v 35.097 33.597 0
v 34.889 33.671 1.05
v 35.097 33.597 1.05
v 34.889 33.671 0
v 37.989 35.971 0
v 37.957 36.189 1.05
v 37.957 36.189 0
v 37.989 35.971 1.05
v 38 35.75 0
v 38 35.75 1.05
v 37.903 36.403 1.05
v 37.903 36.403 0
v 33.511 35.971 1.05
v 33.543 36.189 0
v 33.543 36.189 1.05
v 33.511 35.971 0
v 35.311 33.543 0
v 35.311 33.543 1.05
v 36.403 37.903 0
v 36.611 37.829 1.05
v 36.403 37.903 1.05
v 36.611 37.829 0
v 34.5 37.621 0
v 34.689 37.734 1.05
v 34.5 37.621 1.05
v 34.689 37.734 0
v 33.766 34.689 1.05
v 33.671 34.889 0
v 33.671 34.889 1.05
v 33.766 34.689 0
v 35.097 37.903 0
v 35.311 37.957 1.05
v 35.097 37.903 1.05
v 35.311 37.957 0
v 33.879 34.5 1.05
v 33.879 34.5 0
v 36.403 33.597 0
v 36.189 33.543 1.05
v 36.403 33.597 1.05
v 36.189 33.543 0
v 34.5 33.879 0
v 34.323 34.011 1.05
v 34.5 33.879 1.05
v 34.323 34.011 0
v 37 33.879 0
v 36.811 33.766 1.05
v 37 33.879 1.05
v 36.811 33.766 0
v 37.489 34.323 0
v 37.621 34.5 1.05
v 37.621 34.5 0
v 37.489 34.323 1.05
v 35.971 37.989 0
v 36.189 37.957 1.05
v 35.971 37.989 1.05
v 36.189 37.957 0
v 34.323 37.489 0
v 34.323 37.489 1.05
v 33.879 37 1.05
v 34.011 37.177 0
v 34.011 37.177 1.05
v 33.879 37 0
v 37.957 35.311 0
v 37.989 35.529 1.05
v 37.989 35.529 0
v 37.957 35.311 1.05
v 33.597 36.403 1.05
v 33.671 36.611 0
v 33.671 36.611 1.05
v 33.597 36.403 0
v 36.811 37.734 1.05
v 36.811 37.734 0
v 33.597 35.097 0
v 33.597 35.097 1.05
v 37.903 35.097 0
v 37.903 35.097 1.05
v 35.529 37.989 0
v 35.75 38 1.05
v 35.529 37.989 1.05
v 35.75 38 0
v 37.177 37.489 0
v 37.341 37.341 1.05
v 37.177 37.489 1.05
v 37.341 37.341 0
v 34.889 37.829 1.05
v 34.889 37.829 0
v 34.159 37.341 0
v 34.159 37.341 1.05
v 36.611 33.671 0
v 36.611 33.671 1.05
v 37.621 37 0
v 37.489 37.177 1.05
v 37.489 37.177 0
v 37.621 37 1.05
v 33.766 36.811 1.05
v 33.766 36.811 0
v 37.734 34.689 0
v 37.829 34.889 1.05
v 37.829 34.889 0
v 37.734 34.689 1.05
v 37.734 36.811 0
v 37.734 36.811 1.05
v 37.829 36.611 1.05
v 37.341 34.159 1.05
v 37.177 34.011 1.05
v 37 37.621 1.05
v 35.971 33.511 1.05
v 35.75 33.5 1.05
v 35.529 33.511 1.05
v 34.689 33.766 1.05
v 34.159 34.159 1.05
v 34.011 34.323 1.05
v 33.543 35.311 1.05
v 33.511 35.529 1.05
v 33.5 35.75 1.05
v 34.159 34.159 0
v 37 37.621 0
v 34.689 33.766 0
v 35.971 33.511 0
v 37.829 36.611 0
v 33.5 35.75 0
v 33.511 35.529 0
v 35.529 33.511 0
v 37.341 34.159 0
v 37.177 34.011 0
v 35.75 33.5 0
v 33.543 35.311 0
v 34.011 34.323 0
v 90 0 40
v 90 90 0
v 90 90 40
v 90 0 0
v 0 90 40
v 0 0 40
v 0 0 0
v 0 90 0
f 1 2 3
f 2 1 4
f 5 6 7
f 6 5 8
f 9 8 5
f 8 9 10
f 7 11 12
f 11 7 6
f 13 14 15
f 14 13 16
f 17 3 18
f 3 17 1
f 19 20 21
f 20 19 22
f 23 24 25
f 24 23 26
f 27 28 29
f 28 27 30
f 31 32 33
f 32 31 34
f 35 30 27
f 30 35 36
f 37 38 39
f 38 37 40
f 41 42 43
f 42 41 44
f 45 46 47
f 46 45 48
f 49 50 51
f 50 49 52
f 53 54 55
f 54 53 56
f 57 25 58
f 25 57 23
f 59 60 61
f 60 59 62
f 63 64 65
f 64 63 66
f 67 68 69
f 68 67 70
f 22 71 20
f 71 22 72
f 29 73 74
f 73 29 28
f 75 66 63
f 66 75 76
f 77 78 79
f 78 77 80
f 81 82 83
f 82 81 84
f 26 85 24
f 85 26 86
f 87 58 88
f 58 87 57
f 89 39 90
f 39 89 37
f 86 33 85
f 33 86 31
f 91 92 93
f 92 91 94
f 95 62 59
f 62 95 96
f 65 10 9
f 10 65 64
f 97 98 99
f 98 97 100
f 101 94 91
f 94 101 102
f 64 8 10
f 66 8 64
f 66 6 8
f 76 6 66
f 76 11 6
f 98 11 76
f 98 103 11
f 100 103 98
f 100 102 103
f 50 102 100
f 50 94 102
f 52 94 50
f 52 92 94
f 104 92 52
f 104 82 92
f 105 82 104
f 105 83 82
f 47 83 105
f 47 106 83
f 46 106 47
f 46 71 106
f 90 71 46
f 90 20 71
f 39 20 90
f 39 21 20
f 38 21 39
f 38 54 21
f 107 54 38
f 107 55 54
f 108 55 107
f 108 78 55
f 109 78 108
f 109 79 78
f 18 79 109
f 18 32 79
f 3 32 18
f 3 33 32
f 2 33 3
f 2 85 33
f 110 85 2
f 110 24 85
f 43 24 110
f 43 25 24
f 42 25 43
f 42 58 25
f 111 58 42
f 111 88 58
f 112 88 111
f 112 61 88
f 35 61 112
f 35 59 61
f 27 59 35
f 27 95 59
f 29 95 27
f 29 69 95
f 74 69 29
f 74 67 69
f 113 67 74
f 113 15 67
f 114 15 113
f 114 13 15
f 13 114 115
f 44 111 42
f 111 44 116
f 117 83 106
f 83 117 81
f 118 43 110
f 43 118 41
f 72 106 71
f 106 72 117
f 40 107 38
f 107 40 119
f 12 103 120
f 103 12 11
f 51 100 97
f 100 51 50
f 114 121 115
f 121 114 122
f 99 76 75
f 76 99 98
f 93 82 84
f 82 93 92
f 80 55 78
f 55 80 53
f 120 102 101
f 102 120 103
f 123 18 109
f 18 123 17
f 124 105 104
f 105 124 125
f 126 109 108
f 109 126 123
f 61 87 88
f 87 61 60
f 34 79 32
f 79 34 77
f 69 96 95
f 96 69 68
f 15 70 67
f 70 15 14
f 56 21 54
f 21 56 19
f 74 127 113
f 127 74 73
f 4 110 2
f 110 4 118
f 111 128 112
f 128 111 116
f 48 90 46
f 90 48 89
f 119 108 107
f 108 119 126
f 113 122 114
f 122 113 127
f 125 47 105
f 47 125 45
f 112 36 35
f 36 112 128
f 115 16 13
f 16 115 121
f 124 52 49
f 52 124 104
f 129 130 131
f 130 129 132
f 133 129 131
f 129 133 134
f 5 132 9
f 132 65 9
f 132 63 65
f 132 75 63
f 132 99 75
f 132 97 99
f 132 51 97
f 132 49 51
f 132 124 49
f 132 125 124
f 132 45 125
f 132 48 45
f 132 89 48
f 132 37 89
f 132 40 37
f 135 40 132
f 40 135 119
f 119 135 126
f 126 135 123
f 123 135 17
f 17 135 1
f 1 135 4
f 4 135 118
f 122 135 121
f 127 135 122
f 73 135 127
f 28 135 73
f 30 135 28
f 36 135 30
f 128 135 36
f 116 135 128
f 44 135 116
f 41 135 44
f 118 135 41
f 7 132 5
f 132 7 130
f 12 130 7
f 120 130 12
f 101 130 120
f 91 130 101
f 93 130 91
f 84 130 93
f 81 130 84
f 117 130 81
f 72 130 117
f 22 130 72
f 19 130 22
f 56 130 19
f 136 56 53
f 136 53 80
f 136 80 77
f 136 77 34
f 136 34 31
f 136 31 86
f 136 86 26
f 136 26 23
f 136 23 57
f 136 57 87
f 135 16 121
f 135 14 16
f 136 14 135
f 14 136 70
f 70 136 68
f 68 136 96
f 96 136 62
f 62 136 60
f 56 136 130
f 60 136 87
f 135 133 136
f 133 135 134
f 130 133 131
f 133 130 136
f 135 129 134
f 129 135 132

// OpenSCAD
// DIY Magnetic Stirrer Housing for 80mm PC Fan
// Print Orientation: Upside down (Top plate on bed)
// Units: mm

// --- Dimensions ---
// Outer footprint of the housing
W_OUT = 90;
H_OUT = 90;

// Thickness of the top plate (bottom of the box in print orientation)
THICK_TOP = 2;

// Height of the walls (Total height 40mm - 2mm top plate)
H_WALL = 38; 

// Wall thickness
THICK_WALL = 2.5;

// Fan mounting hole diameter (M4 clearance)
D_FAN_HOLE = 4.5;

// Fan mounting hole pattern: 71.5mm square, centred on the plate
PATTERN_SIZE = 71.5;

// Cable notch dimensions
NOTCH_W = 12;
NOTCH_H = 8; // Depth from open edge (z=40) down to z=32

// Resolution for curved features
$fn = 64;

// --- Helper: Create the main box block ---
module stirrer_housing() {
    // Total height
    h_total = THICK_TOP + H_WALL;
    
    difference() {
        // 1. Main Block
        // Outer size: W_OUT x H_OUT
        // Height: h_total
        // Centered at origin for X/Y, sitting on Z=0
        translate([0, 0, 0])
            cube([W_OUT, H_OUT, h_total], center = false);
        
        // 2. Cut Fan Mounting Holes through the top plate
        // Pattern: 71.5mm square centred on the 90x90 plate.
        // Centers are at: +/- 35.75, +/- 35.75
        // Z range: 0 to THICK_TOP (2mm)
        
        // Define the 4 offsets for the square pattern
        offsets = [
            [-PATTERN_SIZE/2, -PATTERN_SIZE/2],
            [-PATTERN_SIZE/2,  PATTERN_SIZE/2],
            [ PATTERN_SIZE/2, -PATTERN_SIZE/2],
            [ PATTERN_SIZE/2,  PATTERN_SIZE/2]
        ];
        
        for (p = offsets) {
            // p[0] is X offset, p[1] is Y offset
            translate([p[0], p[1], 0])
                cylinder(
                    h = THICK_TOP + 0.1, // Extend slightly past top plate to ensure clean cut
                    r = D_FAN_HOLE/2,
                    center = true
                );
        }
        
        // 3. Cut Cable Notch
        // Location: One wall. Let's choose the wall at X = -W_OUT/2 (Left wall).
        // Wall Face X coordinate: -45
        // Notch Width: 12mm. Centred along the wall (Y direction).
        // Depth: 8mm from the open edge (z=40) down to z=32.
        
        // We define a cutting box that represents the void.
        // Dimensions: [Width, Height, Depth]
        // Width: NOTCH_W (12)
        // Height: H_OUT (90) - must cover the full height of the wall to cut through it cleanly
        // Depth: NOTCH_H (8) + epsilon to ensure it cuts through the wall thickness
        
        // Position:
        // X: Centered on the wall face. The wall face is at X = -45.
        // The notch width is 12. So it spans from -45 - 6 to -45 + 6.
        // Y: Centered on the wall. Wall height is 90. Center is 0.
        // Z: From 32 to 40.
        
        translate([
            -W_OUT/2 - NOTCH_W/2, // X start of notch (-45 - 6 = -51)
            -NOTCH_H/2,           // Y center (0)
            32                    // Z start of notch
        ])
            cube([
                NOTCH_W,          // Width 12
                H_OUT,            // Height 90 (covers full wall)
                NOTCH_H + 0.1     // Depth 8 + epsilon to cut through wall thickness
            ]);
    }
}

// --- Main Assembly ---
// Center the part on the origin as requested
translate([0, 0, 0])
    stirrer_housing();
